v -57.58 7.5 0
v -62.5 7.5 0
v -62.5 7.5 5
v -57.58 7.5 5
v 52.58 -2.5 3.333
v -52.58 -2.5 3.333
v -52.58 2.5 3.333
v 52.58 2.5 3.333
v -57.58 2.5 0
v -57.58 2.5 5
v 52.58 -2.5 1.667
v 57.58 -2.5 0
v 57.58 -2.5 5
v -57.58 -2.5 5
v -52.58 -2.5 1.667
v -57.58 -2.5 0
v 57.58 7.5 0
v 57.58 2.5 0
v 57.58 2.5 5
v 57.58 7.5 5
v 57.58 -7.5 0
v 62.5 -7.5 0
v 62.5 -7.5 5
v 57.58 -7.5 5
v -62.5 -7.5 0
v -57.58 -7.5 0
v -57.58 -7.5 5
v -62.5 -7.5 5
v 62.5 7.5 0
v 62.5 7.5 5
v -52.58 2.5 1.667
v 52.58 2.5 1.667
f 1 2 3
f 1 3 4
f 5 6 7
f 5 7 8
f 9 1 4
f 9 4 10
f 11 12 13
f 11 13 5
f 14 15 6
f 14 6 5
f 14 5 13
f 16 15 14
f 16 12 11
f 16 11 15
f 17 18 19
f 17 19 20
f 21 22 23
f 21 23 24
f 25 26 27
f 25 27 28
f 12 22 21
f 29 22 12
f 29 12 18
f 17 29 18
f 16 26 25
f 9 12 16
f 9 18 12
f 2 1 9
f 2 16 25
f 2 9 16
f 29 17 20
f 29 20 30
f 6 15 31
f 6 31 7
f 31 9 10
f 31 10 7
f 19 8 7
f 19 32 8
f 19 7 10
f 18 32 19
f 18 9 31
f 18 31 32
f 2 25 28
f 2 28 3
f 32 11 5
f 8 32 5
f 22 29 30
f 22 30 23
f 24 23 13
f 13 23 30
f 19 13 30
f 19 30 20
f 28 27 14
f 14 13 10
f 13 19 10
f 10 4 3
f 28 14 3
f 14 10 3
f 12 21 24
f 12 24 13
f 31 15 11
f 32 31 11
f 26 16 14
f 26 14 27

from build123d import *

# Parameters (mm, degrees)
SLIDER_MAIN_BODY_DEPTH = 5
SKETCH4_W              = 105.16
SKETCH4_H              = 1.666666666
CUT_EXTRUDE1_DEPTH     = 64.492125496


with BuildPart() as part:
    # Sketch1 → Slider Main Body (new body)
    with BuildSketch(Plane.XY):
        Polygon((-57.58, 7.5), (-57.58, 2.5), (57.58, 2.5), (57.58, 7.5), (62.5, 7.5), (62.5, -7.5), (57.58, -7.5), (57.58, -2.5), (-57.58, -2.5), (-57.58, -7.5), (-62.5, -7.5), (-62.5, 7.5), align=None)
    extrude(amount=SLIDER_MAIN_BODY_DEPTH)

    # Sketch4 → Cut-Extrude1 (cut, through all)
    with BuildSketch(Plane.XZ.offset(2.5)):
        with Locations((0, 2.5)):
            Rectangle(SKETCH4_W, SKETCH4_H)
    extrude(amount=-CUT_EXTRUDE1_DEPTH, mode=Mode.SUBTRACT)


solid = part.part
